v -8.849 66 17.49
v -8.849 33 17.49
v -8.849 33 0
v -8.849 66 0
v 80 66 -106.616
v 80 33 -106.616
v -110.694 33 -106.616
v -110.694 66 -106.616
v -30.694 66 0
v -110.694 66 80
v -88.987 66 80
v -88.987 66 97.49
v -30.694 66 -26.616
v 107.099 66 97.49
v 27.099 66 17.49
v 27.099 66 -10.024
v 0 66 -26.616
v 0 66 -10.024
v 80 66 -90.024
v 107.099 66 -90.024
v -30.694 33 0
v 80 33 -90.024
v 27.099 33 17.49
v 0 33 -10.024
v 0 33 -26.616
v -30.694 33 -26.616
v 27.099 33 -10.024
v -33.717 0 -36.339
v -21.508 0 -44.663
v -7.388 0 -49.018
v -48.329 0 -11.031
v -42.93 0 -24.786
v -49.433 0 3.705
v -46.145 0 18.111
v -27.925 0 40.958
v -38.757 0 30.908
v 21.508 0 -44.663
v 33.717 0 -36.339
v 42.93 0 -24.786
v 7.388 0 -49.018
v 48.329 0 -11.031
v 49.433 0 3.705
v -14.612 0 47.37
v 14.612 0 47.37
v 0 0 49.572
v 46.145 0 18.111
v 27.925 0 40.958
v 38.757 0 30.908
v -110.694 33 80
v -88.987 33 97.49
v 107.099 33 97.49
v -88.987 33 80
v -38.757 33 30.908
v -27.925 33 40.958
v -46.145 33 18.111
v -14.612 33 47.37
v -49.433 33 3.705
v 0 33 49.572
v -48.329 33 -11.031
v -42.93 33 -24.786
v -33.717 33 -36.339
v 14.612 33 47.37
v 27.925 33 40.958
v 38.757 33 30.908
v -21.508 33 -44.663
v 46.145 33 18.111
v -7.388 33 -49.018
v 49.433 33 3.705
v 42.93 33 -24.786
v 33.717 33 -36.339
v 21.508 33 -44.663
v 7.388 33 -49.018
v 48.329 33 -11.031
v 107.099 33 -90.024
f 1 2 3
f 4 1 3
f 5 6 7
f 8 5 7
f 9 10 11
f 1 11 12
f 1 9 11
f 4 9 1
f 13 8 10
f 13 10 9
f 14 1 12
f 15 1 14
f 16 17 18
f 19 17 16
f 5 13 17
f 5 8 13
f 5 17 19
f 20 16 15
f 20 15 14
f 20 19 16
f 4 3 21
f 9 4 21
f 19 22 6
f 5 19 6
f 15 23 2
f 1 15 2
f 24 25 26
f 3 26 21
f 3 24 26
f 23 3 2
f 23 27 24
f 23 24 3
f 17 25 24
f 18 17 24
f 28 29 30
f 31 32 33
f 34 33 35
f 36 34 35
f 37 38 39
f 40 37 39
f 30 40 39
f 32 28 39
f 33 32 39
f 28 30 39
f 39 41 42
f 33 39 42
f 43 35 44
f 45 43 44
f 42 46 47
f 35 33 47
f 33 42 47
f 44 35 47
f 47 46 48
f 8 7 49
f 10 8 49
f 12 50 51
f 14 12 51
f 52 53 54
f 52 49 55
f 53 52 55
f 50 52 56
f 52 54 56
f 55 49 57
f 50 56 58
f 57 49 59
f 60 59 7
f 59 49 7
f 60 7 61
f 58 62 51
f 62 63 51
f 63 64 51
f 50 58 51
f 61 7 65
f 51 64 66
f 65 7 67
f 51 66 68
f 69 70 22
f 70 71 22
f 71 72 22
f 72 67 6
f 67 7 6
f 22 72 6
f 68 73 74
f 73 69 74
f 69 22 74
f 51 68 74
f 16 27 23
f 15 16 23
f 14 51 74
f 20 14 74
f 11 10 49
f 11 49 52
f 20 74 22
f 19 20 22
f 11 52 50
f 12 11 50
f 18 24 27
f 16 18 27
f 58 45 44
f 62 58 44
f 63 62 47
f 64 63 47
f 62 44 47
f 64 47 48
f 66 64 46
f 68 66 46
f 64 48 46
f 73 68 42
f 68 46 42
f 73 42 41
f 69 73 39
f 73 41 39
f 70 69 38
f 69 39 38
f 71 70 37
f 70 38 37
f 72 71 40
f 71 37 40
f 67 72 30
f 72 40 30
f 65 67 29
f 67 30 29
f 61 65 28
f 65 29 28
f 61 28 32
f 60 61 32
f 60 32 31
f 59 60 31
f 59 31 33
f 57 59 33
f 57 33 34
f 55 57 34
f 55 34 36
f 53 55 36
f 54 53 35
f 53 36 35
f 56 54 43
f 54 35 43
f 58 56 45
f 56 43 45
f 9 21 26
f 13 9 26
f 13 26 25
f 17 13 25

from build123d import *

# Parameters (mm, degrees)
SKIZZE1_R                       = 49.571868138
AUFSATZ_LINEAR_AUSTRAGEN6_DEPTH = 33
LINEAR_AUSTRAGEN_D_NN9_DEPTH    = 33


with BuildPart() as part:
    # Skizze1 → Aufsatz-Linear austragen6 (new body)
    with BuildSketch(Plane(origin=(0, 0, 0), x_dir=(1, 0, 0), z_dir=(0, 1, 0))):
        with Locations(Location((0, 0, 0), (0, 0, 270))):
            Circle(SKIZZE1_R)
    extrude(amount=AUFSATZ_LINEAR_AUSTRAGEN6_DEPTH)

    # Skizze2 → Linear-Austragen-Dünn9 (add)
    with BuildSketch(Plane(origin=(0, 33, 0), x_dir=(1, 0, 0), z_dir=(0, 1, 0))):
        Polygon((-8.848811268, 0), (-30.694314085, 0), (-30.694314085, 26.615565141), (0, 26.615565141), (0, 10.300569366), (80, 10.300569366), (80, 106.615565141), (-110.694314085, 106.615565141), (-110.694314085, -80), (-8.848811268, -80), align=None)
        Polygon((0, 10.024044014), (27.099484508, 10.024044014), (27.099484508, -17.490228521), (-8.987073944, -17.490228521), (-8.987073944, 0), (-88.987073944, 0), (-88.987073944, -97.490228521), (107.099484508, -97.490228521), (107.099484508, 90.024044014), (0, 90.024044014), align=None)
    extrude(amount=LINEAR_AUSTRAGEN_D_NN9_DEPTH)


solid = part.part
